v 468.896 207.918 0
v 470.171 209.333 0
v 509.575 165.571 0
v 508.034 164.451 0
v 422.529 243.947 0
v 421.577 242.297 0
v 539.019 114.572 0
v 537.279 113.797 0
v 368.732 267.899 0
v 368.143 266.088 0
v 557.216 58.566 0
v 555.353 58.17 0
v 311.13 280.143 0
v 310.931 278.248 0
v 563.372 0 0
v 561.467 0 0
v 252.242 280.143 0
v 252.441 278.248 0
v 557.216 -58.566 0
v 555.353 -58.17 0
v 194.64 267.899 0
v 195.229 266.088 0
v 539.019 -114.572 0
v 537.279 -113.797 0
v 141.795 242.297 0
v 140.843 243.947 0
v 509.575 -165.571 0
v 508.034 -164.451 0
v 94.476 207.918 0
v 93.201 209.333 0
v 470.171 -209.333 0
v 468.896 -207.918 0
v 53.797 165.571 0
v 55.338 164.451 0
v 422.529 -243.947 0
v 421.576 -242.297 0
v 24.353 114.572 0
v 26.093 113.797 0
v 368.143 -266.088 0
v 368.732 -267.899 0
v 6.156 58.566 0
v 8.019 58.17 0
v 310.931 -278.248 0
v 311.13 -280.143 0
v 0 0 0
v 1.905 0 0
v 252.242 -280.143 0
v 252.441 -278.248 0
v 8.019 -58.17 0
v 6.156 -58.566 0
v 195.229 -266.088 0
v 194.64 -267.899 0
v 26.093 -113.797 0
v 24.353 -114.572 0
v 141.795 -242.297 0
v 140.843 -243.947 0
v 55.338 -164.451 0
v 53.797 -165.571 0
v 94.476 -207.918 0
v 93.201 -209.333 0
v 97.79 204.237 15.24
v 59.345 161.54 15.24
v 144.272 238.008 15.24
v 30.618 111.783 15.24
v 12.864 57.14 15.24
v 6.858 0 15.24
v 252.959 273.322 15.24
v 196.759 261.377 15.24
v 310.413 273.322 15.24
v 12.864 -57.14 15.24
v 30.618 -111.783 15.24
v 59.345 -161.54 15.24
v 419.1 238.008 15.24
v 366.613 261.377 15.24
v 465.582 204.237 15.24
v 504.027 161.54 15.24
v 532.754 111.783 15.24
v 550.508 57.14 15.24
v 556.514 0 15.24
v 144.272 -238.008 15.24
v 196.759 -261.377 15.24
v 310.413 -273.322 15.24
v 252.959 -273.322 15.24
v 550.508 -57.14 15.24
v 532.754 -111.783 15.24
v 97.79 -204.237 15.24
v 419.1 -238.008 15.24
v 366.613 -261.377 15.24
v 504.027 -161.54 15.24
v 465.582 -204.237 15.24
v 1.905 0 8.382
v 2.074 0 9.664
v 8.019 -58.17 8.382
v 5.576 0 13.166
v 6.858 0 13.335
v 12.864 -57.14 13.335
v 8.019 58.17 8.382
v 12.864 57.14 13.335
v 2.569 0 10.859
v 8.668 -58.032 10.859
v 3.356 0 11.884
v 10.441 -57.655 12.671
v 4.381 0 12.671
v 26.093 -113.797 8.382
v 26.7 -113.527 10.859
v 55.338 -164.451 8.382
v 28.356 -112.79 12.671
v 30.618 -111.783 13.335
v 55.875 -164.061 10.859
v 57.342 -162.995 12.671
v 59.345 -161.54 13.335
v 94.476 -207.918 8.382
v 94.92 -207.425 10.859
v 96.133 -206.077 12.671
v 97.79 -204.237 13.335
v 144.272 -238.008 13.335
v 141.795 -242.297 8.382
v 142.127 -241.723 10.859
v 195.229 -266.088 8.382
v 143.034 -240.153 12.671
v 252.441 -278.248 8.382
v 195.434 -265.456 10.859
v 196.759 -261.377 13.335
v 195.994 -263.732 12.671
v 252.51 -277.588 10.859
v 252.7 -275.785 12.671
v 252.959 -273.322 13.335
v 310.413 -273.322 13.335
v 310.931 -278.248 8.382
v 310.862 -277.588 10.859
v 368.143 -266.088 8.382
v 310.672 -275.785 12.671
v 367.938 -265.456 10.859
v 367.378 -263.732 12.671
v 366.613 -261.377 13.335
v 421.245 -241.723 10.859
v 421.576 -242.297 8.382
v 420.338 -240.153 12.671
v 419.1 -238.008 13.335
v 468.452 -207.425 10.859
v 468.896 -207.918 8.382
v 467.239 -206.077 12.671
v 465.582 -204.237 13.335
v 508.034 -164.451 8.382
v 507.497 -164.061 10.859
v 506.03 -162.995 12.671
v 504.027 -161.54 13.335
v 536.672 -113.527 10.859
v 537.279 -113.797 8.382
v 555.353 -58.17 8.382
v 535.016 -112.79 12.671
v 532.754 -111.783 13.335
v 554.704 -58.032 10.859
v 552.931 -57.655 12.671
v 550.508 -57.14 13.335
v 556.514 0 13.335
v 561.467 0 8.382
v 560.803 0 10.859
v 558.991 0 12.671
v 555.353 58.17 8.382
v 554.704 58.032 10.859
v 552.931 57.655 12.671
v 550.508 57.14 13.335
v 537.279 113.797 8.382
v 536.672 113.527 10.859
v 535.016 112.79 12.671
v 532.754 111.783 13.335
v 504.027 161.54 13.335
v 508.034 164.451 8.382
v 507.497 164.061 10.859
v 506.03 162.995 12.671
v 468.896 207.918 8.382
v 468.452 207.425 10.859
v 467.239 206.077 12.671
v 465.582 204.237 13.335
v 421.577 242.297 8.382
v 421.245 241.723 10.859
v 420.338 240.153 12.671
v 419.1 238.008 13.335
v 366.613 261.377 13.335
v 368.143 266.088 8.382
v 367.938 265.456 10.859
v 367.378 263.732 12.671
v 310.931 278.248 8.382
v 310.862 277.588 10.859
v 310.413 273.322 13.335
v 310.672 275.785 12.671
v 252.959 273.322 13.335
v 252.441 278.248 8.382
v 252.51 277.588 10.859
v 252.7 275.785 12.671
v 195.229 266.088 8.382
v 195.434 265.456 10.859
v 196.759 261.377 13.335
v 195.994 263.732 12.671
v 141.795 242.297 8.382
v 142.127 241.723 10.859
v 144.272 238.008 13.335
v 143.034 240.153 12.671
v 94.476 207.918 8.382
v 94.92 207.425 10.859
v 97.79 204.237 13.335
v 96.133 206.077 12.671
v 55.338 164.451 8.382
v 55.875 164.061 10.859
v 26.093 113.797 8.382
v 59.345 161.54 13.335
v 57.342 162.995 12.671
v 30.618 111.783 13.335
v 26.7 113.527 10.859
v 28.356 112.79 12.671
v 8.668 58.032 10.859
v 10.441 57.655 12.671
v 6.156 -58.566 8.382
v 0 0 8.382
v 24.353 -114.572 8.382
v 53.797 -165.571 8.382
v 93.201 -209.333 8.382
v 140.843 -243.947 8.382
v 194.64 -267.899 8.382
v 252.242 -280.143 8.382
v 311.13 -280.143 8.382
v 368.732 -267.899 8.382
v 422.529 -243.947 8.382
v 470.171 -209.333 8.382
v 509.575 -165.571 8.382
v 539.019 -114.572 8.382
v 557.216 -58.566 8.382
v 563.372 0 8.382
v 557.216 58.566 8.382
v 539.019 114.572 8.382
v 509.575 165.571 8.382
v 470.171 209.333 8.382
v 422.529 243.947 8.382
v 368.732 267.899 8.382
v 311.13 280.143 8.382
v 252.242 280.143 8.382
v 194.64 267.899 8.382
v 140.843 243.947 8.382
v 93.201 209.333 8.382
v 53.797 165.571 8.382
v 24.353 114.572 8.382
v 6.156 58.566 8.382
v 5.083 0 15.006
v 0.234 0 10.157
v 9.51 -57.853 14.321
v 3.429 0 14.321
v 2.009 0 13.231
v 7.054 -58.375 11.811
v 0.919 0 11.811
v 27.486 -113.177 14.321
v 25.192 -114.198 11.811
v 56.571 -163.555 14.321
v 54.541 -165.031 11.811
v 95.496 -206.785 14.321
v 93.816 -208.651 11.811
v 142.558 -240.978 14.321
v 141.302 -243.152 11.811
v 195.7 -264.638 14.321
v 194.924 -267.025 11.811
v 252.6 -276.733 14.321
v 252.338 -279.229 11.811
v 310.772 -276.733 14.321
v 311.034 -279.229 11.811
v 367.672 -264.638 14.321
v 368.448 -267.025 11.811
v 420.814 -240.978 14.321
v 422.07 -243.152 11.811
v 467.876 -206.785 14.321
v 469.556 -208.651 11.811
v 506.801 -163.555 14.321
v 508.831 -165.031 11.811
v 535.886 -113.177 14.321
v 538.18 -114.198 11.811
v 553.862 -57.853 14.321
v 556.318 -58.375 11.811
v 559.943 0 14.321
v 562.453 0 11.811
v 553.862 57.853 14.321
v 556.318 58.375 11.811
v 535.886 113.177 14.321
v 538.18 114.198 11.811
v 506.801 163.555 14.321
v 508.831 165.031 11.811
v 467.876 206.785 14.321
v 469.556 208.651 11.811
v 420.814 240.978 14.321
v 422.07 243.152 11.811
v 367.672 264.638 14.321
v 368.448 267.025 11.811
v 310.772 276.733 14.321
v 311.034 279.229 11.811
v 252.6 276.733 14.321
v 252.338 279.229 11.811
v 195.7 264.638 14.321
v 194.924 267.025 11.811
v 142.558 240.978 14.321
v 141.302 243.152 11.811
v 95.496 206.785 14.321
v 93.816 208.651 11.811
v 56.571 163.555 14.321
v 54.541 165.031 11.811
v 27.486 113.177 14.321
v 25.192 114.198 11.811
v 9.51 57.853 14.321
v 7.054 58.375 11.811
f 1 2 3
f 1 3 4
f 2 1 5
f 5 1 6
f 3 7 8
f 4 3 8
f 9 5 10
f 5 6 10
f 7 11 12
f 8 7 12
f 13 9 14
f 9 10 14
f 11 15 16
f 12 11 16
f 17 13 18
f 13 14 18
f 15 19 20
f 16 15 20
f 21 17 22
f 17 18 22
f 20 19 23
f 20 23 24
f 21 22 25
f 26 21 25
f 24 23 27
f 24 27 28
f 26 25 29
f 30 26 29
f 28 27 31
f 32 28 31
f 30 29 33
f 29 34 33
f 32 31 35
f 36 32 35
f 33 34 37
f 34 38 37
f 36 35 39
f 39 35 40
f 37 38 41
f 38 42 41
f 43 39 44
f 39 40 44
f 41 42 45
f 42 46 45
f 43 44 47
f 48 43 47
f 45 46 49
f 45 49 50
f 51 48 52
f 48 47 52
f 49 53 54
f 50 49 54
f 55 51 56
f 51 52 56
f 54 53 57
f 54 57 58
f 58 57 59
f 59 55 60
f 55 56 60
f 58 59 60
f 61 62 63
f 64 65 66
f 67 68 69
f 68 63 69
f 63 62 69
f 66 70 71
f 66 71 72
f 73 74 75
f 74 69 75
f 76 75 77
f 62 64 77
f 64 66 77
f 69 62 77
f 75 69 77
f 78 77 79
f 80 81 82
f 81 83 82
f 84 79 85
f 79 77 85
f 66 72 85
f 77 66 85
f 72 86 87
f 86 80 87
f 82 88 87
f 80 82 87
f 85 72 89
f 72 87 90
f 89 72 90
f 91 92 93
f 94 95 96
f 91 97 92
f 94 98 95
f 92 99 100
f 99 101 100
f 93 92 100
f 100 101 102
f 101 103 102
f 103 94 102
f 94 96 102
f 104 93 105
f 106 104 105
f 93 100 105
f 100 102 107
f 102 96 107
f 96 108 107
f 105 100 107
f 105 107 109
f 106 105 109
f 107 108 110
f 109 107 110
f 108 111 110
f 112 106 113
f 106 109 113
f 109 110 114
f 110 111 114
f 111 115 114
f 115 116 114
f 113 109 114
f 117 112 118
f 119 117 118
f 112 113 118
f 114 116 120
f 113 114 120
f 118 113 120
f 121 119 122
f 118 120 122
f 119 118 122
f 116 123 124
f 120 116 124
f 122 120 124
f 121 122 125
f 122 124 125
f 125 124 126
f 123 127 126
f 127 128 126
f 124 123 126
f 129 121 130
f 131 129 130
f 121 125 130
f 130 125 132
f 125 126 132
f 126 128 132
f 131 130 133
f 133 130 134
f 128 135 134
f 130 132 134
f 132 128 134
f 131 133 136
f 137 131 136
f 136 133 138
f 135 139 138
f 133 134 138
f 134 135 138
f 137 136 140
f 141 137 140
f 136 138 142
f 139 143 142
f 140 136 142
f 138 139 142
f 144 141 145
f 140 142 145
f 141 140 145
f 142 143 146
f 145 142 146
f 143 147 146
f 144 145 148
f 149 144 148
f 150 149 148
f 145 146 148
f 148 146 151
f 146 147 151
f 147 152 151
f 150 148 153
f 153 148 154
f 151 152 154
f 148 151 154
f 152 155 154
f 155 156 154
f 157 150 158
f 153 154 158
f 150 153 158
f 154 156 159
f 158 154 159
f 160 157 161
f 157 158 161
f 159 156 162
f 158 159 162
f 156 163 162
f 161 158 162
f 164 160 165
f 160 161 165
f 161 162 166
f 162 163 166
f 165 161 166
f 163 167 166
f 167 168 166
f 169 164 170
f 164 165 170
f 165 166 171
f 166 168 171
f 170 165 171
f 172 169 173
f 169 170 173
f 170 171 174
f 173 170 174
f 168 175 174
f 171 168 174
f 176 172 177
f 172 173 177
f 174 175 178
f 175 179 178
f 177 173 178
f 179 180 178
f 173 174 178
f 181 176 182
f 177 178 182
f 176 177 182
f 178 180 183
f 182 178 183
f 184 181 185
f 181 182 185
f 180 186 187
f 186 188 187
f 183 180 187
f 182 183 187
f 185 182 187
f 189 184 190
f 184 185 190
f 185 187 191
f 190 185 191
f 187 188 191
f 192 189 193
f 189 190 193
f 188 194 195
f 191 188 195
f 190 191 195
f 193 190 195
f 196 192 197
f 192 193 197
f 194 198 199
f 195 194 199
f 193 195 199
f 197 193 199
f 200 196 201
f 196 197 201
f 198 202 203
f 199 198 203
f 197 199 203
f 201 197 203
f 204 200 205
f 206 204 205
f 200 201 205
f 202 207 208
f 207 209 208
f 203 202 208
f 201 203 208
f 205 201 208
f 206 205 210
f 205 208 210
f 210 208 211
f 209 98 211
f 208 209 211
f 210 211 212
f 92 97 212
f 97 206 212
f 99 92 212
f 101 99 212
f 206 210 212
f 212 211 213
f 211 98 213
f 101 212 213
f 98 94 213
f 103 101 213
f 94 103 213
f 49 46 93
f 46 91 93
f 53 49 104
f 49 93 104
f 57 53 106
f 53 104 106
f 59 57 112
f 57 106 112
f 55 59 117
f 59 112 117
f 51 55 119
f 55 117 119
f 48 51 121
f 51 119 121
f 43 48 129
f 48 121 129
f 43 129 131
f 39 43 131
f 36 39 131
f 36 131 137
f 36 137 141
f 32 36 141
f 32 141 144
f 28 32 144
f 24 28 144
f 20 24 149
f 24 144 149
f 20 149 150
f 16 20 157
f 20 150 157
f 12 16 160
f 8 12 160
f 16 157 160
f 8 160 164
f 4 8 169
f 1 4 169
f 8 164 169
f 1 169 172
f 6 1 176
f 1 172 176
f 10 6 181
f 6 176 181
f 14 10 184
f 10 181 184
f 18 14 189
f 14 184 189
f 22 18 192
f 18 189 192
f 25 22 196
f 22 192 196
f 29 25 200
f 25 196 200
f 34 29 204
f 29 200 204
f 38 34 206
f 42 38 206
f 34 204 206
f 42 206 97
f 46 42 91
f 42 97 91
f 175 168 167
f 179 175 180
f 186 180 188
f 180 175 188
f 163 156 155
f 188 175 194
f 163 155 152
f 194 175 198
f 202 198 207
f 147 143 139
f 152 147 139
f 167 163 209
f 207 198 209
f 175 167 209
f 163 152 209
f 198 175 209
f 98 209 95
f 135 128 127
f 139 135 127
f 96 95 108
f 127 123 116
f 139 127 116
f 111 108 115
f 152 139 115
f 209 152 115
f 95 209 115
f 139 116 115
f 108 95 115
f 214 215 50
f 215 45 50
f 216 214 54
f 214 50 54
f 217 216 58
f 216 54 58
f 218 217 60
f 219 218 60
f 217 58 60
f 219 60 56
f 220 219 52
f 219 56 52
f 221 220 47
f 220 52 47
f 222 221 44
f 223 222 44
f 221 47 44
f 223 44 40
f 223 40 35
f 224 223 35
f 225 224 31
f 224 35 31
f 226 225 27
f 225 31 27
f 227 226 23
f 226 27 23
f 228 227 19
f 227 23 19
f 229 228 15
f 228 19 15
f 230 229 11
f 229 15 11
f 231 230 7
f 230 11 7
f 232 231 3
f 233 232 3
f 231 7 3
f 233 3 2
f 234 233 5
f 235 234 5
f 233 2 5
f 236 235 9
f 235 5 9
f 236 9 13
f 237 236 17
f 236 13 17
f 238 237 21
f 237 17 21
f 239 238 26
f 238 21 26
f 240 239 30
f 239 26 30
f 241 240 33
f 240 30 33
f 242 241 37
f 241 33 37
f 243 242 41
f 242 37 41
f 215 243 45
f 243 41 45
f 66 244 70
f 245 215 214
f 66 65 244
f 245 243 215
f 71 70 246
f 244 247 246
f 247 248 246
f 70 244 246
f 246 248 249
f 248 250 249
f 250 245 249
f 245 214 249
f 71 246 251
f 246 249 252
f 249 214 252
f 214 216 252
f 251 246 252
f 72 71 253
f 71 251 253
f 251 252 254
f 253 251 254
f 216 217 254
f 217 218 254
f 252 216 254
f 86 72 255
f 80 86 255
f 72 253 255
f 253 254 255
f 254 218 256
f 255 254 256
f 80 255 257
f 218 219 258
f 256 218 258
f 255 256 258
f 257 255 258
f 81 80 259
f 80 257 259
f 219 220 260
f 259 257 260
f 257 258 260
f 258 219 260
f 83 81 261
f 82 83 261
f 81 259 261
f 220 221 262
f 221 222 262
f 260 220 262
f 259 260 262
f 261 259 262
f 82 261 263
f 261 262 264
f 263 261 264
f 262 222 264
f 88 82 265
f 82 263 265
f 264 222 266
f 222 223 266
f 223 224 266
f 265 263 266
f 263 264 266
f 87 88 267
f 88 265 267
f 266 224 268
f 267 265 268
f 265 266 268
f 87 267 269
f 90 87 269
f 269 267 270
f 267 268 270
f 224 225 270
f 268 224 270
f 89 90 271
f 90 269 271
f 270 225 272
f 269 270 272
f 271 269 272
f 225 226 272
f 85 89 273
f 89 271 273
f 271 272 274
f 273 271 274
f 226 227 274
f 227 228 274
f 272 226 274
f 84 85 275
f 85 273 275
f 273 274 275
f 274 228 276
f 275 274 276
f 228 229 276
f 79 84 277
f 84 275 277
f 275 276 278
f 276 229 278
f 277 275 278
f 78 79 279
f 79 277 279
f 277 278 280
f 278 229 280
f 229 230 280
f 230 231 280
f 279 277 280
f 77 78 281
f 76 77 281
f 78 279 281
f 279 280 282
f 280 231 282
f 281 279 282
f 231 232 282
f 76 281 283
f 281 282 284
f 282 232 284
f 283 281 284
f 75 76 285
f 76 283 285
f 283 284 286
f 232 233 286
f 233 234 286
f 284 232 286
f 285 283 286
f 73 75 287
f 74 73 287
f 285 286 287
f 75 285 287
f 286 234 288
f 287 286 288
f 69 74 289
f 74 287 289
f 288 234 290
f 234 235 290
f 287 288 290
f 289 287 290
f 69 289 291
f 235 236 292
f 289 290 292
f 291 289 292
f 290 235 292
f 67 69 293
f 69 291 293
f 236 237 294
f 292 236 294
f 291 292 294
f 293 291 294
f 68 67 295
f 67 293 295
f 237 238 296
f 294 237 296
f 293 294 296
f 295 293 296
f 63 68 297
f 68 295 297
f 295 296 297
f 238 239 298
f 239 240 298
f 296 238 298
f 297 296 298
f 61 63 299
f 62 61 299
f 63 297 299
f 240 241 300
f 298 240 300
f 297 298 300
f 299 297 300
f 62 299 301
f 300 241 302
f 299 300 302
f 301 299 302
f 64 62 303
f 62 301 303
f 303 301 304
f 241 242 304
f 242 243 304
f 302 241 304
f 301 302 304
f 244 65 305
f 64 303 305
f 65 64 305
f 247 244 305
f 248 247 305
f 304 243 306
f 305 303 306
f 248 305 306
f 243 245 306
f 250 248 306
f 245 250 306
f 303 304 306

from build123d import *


with BuildPart() as f1:
    # F0 (on Front) → F1 (revolve)
    with BuildSketch(Plane.XZ):
        with BuildLine():
            Line((0, 8.382), (0, 0))
            Line((0, 0), (1.905, 0))
            Line((1.905, 0), (1.905, 8.382))
            ThreePointArc((1.905, 8.382), (3.3557, 11.8843), (6.858, 13.335))
            Line((6.858, 13.335), (281.686, 13.335))
            Line((281.686, 13.335), (281.686, 15.24))
            Line((281.686, 15.24), (23.494648, 15.24))
            Line((23.494648, 15.24), (6.858, 15.24))
            ThreePointArc((6.858, 15.24), (2.008662, 13.231338), (0, 8.382))
        make_face()
    revolve(axis=Axis((281.686, 0, 14.2875), (0, 0, 1)))


solid = f1.part
